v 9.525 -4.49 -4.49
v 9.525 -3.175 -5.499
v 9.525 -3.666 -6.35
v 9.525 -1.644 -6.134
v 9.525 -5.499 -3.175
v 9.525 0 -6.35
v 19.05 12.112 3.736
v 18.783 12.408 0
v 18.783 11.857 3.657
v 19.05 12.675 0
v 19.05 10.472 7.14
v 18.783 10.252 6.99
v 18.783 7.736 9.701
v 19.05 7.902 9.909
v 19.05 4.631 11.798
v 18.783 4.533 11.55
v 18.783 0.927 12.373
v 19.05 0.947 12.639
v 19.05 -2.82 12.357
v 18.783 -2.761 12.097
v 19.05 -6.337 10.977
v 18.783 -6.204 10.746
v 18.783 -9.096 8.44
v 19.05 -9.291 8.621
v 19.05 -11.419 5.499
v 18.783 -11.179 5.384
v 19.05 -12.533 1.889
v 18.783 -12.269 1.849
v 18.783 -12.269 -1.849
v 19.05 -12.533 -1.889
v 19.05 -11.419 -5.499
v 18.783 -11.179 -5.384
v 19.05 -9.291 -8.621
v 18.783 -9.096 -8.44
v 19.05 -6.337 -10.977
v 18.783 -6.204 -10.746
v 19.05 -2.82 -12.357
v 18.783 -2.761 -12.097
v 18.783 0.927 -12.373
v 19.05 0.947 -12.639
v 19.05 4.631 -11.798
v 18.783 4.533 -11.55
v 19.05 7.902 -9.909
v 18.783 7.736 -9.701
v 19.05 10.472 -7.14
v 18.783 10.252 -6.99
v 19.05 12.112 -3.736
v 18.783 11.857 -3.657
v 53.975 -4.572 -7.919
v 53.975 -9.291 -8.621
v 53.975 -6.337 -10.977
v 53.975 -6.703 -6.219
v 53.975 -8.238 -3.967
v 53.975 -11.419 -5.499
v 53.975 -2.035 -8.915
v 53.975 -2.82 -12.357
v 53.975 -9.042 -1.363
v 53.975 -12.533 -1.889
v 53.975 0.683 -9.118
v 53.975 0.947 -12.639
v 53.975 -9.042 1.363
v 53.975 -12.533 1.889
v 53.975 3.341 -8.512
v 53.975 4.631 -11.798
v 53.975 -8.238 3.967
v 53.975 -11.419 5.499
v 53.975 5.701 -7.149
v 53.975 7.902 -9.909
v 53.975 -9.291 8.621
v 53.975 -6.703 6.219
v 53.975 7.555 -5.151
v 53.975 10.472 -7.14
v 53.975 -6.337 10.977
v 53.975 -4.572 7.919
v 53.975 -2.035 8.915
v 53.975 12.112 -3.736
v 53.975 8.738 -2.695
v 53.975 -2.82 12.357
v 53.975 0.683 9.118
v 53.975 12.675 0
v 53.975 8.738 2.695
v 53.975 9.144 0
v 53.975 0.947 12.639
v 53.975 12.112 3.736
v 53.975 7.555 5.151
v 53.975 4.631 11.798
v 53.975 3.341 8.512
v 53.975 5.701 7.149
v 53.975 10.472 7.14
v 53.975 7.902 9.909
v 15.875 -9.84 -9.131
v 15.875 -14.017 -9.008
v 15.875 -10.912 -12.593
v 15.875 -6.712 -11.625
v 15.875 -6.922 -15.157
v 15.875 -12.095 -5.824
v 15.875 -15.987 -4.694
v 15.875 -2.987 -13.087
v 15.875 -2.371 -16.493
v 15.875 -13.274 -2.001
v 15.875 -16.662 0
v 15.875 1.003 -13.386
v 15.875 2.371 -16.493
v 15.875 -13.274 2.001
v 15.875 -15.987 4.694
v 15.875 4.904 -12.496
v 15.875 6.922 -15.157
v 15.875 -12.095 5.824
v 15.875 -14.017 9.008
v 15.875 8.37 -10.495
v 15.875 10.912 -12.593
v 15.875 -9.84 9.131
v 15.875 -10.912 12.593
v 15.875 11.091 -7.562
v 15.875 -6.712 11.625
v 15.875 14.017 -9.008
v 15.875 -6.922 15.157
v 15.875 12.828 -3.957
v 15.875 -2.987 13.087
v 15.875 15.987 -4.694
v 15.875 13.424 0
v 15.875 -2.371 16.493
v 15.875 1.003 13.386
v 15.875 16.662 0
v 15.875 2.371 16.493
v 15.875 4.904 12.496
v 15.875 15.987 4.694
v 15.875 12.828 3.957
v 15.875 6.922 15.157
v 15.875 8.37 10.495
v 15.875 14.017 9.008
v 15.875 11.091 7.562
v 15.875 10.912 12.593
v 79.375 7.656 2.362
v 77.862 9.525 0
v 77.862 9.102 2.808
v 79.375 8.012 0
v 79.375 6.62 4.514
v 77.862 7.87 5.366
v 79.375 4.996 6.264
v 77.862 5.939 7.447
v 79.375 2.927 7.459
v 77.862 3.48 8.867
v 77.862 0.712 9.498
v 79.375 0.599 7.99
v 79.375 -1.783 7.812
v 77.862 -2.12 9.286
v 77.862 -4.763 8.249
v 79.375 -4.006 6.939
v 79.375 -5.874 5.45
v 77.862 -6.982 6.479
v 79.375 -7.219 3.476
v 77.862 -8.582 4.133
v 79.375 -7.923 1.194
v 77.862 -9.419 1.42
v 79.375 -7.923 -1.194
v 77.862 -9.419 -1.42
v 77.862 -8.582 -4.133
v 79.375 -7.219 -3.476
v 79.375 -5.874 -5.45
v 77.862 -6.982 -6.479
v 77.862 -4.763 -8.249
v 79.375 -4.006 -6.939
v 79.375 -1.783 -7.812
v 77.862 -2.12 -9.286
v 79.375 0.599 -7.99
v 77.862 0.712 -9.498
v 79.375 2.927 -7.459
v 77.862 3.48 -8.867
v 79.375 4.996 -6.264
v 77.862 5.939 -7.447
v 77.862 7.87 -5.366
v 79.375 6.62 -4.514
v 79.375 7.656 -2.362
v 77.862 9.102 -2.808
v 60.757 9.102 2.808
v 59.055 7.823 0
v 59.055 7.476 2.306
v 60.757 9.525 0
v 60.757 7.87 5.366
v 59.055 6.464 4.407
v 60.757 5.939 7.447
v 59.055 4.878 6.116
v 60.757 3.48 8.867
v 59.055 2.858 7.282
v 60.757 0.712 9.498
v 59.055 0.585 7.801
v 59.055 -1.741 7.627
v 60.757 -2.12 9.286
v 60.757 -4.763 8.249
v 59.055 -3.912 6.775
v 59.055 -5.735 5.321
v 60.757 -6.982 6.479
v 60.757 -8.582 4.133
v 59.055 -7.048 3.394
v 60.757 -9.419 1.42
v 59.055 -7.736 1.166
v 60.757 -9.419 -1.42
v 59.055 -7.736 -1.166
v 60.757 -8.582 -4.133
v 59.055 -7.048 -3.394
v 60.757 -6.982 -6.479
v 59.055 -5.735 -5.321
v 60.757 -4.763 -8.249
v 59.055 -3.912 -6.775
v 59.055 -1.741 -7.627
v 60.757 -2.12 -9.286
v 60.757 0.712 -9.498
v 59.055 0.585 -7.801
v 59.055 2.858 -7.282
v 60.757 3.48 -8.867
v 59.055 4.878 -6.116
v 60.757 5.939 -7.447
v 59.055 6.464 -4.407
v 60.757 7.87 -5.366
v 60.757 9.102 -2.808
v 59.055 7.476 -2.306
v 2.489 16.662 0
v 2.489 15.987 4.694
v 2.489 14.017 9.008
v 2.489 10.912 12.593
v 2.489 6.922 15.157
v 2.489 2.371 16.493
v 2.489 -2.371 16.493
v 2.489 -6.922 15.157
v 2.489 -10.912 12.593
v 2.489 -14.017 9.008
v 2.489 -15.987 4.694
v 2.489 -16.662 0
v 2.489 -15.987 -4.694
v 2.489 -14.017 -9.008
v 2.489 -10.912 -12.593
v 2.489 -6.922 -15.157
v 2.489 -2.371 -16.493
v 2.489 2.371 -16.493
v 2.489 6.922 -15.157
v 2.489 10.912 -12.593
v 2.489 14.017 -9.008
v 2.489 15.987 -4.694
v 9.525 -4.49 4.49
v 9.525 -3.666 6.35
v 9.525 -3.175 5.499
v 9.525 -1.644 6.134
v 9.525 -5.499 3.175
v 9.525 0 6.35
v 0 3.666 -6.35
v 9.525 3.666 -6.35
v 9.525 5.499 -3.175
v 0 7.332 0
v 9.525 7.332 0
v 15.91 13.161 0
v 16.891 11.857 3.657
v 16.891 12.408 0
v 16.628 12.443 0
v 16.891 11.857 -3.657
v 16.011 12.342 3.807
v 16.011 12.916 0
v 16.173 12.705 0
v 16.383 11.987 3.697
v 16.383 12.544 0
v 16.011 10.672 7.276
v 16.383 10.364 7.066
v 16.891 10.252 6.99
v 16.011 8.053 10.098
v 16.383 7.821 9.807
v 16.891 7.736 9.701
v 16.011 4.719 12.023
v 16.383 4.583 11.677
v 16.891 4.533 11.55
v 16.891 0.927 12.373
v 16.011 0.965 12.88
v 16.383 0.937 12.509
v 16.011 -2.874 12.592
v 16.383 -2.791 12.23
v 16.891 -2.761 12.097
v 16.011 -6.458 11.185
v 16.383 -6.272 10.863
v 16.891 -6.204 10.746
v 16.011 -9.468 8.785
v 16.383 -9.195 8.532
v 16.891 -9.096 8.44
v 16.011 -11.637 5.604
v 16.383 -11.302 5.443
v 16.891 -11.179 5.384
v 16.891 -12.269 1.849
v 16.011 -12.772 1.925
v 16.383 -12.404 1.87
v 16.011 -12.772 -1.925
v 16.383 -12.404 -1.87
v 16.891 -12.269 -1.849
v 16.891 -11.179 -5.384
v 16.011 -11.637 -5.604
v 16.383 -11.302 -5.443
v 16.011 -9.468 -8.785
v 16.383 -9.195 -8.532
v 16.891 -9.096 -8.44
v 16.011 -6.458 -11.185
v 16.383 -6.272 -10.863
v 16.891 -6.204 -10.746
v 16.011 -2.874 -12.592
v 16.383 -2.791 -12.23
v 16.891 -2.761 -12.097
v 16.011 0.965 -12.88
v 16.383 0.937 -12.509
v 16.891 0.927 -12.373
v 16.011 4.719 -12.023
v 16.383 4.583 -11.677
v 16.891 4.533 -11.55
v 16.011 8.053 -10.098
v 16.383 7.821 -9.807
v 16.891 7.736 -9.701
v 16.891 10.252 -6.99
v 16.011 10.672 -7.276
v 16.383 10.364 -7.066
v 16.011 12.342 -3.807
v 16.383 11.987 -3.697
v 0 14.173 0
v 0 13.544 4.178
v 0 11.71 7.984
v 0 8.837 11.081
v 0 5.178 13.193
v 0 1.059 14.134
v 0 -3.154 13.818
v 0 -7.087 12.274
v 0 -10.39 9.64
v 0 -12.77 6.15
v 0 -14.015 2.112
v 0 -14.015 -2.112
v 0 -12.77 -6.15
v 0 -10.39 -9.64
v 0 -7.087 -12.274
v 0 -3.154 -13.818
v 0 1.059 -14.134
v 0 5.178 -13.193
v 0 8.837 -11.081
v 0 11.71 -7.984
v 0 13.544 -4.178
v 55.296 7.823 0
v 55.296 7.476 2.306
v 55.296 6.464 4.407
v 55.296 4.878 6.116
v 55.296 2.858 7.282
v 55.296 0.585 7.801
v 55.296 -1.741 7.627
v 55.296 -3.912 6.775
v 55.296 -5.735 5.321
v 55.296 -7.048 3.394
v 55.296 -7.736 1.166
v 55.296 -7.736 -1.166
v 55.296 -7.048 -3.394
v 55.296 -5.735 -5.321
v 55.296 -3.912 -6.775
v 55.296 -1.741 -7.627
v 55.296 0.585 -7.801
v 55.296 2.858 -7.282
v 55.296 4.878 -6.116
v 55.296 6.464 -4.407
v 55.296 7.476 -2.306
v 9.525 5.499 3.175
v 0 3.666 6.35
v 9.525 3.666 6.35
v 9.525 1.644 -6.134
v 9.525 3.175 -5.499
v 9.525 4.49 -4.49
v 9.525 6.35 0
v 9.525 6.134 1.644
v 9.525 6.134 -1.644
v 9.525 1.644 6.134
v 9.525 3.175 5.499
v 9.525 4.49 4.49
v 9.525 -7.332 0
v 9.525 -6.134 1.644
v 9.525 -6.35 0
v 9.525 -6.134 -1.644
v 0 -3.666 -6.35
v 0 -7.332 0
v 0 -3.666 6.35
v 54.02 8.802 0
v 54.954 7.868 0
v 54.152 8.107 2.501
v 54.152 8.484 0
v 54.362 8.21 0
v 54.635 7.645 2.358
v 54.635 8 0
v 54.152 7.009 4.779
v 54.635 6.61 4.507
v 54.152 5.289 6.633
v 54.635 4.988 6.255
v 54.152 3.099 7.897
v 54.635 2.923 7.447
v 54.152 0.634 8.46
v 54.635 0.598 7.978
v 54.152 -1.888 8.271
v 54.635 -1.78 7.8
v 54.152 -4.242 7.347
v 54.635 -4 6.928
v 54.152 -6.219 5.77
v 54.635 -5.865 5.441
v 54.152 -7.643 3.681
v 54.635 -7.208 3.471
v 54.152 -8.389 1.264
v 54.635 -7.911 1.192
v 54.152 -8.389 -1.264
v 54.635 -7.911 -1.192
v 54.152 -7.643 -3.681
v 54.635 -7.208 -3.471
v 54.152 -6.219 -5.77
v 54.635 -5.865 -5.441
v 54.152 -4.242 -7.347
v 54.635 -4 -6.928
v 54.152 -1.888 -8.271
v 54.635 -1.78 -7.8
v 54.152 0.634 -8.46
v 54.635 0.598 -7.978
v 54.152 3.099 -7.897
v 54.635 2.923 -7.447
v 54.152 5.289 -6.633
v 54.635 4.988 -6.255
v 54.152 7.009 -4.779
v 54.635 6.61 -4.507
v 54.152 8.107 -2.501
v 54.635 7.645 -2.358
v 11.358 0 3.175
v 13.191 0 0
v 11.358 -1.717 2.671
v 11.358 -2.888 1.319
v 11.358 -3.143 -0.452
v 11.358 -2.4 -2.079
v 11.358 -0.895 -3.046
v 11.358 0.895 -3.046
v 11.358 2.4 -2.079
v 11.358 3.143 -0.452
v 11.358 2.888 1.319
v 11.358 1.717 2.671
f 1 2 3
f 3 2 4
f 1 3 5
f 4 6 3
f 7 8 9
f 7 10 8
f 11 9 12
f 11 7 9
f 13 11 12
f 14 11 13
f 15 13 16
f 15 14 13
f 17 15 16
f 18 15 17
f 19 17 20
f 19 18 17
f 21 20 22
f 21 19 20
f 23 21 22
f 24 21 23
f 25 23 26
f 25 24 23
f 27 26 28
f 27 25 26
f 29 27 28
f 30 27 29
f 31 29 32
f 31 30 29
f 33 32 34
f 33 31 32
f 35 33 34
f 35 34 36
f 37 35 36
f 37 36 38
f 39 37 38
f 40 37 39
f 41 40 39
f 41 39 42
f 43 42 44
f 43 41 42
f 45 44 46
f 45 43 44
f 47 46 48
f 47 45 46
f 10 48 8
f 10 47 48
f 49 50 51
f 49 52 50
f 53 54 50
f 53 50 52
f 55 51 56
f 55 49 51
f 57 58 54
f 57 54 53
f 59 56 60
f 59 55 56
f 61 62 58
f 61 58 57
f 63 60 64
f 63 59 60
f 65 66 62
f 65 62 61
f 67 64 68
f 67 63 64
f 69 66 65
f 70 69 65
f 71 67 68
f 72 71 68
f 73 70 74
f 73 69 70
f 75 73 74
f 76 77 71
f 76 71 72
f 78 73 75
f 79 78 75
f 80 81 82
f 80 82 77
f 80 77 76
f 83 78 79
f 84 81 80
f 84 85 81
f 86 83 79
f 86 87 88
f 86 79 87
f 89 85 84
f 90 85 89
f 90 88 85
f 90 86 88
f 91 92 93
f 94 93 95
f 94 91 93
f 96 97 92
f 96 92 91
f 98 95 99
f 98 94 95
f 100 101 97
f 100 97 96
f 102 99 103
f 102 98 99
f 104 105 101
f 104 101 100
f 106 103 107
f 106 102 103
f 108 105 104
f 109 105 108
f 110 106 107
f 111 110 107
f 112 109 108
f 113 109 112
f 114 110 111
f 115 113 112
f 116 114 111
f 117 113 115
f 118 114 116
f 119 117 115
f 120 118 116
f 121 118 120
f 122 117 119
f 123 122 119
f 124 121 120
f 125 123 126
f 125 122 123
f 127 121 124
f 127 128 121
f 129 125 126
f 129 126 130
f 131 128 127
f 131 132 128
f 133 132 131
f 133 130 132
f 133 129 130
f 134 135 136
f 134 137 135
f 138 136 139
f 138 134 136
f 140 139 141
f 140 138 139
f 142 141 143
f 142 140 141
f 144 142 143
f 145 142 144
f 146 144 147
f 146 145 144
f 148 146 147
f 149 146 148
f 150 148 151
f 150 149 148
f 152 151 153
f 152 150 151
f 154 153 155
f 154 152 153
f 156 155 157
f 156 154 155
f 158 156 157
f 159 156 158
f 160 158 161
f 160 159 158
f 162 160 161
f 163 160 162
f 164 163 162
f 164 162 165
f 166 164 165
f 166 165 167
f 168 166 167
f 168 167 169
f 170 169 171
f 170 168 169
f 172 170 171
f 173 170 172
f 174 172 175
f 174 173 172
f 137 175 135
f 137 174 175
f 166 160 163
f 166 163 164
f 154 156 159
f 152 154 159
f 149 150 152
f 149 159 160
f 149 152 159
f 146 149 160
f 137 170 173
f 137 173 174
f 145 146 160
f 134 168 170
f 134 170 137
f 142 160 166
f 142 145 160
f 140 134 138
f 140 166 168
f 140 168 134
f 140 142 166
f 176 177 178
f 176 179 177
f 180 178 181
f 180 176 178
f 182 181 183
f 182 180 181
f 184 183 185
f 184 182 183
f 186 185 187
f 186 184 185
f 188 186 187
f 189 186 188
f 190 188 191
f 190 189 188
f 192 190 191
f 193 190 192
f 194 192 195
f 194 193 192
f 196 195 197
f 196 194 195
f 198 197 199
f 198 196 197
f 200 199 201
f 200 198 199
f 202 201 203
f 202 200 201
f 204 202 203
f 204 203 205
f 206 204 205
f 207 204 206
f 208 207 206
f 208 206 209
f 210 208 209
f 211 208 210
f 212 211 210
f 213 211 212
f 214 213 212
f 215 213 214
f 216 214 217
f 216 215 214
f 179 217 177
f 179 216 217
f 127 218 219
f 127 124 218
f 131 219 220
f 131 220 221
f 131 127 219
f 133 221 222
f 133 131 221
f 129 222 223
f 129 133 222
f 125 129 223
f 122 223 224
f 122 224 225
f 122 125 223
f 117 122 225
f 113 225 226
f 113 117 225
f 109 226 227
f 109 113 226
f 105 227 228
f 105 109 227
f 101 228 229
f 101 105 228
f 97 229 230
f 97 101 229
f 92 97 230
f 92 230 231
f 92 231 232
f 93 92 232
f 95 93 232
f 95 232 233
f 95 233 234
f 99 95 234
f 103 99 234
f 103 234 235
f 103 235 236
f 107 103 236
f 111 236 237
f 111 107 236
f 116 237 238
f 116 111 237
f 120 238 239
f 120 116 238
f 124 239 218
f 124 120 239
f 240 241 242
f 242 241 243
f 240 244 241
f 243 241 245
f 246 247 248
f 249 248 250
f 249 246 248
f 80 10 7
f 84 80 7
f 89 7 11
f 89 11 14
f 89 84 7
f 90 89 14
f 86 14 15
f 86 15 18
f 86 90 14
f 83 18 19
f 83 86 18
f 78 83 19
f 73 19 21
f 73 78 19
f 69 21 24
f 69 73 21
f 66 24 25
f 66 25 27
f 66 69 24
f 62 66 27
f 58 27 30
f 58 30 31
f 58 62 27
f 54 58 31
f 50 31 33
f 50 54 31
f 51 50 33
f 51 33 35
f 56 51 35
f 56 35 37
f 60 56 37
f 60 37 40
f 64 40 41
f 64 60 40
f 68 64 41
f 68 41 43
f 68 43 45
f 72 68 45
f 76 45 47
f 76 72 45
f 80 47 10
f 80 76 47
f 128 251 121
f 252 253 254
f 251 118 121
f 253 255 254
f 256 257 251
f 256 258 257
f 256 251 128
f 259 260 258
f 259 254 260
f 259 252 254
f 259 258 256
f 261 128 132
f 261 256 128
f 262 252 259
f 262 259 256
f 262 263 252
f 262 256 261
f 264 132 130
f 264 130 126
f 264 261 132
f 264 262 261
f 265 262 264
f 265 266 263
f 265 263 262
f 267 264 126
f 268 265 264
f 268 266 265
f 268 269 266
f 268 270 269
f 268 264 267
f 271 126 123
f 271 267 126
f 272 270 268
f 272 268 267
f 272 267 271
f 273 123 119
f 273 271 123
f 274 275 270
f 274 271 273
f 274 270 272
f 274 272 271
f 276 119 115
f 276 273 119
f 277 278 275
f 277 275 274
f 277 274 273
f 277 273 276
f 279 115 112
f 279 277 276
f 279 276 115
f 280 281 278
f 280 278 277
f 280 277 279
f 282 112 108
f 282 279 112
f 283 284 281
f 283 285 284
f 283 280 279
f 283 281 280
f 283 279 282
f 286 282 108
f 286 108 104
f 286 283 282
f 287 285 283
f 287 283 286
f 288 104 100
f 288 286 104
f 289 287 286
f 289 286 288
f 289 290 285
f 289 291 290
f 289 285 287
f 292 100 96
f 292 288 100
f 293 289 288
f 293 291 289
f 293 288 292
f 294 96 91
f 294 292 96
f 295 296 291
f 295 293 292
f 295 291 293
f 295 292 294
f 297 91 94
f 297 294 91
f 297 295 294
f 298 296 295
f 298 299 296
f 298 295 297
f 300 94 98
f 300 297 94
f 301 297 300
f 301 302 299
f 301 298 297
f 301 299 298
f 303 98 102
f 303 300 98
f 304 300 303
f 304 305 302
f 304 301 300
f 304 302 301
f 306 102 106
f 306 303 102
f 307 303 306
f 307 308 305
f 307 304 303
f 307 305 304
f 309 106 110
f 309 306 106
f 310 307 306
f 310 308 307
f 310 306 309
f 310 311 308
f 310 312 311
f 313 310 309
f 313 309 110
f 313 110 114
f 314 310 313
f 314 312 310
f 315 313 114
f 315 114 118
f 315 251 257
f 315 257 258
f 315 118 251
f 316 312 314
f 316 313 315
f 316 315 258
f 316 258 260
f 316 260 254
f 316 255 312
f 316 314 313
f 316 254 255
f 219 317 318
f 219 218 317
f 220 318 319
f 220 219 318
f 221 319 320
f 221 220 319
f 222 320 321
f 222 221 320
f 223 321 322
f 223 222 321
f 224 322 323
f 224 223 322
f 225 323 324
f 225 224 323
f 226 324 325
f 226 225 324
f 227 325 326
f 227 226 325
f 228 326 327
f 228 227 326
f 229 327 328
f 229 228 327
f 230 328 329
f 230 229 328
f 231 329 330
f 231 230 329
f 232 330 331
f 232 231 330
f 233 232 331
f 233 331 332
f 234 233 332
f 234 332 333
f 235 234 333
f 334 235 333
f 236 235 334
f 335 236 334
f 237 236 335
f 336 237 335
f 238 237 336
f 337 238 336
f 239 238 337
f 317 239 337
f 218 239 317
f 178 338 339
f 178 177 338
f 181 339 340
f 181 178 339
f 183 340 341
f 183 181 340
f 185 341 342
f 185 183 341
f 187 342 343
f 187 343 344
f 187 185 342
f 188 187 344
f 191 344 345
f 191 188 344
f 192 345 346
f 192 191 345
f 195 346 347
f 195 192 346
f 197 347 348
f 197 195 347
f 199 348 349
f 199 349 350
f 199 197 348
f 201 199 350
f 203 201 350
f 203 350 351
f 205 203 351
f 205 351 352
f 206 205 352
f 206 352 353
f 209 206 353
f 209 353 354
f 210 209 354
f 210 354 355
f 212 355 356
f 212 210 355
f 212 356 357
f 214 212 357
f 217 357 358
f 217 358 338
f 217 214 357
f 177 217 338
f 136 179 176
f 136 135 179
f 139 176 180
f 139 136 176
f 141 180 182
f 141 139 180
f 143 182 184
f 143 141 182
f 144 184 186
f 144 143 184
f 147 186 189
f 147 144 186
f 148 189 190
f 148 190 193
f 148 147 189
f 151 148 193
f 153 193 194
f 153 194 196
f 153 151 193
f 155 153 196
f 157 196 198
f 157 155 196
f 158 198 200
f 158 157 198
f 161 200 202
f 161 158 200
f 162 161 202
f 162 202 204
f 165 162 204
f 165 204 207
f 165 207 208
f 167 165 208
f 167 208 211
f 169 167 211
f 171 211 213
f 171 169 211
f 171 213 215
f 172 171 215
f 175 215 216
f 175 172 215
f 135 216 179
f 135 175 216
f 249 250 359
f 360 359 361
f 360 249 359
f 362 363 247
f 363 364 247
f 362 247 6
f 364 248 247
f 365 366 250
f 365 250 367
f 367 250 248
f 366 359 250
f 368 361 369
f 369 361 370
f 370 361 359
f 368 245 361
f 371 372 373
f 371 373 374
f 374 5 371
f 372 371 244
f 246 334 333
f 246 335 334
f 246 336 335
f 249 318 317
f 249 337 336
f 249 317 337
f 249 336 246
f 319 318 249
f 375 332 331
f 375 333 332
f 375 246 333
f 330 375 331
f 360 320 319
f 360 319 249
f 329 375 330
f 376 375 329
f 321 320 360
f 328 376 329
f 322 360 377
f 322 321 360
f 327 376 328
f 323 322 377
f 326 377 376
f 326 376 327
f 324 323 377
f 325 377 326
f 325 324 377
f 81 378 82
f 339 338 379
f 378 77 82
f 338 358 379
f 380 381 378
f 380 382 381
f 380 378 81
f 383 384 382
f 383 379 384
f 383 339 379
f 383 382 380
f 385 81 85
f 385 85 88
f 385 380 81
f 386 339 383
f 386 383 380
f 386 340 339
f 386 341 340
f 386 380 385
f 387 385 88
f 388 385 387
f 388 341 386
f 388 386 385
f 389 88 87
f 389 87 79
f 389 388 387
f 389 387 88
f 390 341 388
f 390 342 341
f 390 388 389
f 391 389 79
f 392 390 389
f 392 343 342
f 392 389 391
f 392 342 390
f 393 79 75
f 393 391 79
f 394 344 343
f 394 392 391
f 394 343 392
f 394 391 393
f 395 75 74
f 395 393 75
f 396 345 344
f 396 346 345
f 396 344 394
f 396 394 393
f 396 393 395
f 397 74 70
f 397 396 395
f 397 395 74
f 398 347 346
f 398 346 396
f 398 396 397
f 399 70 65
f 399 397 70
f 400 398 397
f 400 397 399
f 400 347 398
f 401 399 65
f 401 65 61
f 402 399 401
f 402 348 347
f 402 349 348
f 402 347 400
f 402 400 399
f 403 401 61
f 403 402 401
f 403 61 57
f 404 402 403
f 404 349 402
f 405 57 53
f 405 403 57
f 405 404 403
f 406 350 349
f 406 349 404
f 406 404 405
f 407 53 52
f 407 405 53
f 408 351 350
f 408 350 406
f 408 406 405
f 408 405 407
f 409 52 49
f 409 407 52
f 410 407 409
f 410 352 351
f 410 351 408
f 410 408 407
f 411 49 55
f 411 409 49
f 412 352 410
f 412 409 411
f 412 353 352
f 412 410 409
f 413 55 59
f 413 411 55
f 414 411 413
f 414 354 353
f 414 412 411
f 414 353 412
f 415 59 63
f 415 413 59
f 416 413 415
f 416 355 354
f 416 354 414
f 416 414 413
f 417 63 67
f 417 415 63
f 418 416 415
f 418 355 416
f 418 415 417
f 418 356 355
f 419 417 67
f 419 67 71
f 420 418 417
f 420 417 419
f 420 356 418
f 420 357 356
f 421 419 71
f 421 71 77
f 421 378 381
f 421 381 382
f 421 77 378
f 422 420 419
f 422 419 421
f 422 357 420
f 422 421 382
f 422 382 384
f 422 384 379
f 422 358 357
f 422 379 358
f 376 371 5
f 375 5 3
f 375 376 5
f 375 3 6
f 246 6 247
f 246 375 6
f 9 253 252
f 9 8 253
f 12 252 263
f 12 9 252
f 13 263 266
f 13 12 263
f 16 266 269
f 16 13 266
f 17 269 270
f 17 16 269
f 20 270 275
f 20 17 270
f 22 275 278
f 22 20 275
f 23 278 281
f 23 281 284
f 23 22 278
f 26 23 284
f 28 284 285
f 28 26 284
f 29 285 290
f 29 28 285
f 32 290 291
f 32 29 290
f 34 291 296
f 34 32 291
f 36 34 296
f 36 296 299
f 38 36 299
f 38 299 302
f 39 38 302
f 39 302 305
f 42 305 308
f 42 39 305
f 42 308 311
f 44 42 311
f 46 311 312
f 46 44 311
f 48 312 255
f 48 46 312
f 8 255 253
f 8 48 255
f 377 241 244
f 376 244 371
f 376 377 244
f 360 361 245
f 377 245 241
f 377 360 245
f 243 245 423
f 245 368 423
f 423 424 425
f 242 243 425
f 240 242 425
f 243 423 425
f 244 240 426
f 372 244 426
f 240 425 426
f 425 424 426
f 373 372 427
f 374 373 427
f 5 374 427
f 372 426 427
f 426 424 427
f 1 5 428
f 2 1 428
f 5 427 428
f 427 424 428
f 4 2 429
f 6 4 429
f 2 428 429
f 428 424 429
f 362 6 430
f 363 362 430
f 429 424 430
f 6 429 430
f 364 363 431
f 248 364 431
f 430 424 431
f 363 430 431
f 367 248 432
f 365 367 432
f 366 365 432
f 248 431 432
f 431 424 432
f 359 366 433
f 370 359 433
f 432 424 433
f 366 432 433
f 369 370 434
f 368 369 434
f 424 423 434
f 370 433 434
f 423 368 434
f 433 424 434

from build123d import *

# Parameters (mm, degrees)
HEX_2_DEPTH = 9.525


# Read off the part's stored shape, not the designer's step: ThreadSchematic
with BuildPart() as part:
    # ThreadSchematic outline → ThreadSchematic (revolve)
    with BuildSketch(Plane.YX):
        with BuildLine():
            Line((0, 79.375), (0, 0))
            Line((0, 0), (14.1732, 0))
            Line((14.1732, 0), (16.6624, 2.4892))
            Line((16.6624, 2.4892), (16.6624, 15.875))
            Line((16.6624, 15.875), (13.4239, 15.875))
            ThreePointArc((13.4239, 15.875), (12.70547951, 16.17257951), (12.4079, 16.891))
            Line((12.4079, 16.891), (12.4079, 18.7833))
            Line((12.4079, 18.7833), (12.6746, 19.05))
            Line((12.6746, 19.05), (12.6746, 53.975))
            Line((12.6746, 53.975), (9.144, 53.975))
            ThreePointArc((9.144, 53.975), (8.210053363, 54.361853363), (7.8232, 55.2958))
            Line((7.8232, 55.2958), (7.8232, 59.055))
            Line((7.8232, 59.055), (9.525, 60.7568))
            Line((9.525, 60.7568), (9.525, 77.86243))
            Line((9.525, 77.86243), (8.01243, 79.375))
            Line((8.01243, 79.375), (0, 79.375))
        make_face()
    revolve(axis=Axis((0, 0, 0), (1, 0, 0)))

    # Sketch2 → PreBroach (revolve, cut)
    with BuildSketch(Plane.XY, mode=Mode.PRIVATE) as prebroach_sk:
        Polygon((0, 6.35), (9.525, 6.35), (13.191174209, 0), (0, 0), align=None)
    revolve(prebroach_sk.sketch.rotate(Axis((0, 0, 0), (1, 0, 0)), 90), axis=Axis((0, 0, 0), (1, 0, 0)), mode=Mode.SUBTRACT)

    # Sketch3 → Hex 2 (cut)
    with BuildSketch(Plane.ZY):
        Polygon((-6.35, -3.666174209), (-6.35, 3.666174209), (0, 7.332348419), (6.35, 3.666174209), (6.35, -3.666174209), (0, -7.332348419), align=None)
    extrude(amount=-HEX_2_DEPTH, mode=Mode.SUBTRACT)


solid = part.part
